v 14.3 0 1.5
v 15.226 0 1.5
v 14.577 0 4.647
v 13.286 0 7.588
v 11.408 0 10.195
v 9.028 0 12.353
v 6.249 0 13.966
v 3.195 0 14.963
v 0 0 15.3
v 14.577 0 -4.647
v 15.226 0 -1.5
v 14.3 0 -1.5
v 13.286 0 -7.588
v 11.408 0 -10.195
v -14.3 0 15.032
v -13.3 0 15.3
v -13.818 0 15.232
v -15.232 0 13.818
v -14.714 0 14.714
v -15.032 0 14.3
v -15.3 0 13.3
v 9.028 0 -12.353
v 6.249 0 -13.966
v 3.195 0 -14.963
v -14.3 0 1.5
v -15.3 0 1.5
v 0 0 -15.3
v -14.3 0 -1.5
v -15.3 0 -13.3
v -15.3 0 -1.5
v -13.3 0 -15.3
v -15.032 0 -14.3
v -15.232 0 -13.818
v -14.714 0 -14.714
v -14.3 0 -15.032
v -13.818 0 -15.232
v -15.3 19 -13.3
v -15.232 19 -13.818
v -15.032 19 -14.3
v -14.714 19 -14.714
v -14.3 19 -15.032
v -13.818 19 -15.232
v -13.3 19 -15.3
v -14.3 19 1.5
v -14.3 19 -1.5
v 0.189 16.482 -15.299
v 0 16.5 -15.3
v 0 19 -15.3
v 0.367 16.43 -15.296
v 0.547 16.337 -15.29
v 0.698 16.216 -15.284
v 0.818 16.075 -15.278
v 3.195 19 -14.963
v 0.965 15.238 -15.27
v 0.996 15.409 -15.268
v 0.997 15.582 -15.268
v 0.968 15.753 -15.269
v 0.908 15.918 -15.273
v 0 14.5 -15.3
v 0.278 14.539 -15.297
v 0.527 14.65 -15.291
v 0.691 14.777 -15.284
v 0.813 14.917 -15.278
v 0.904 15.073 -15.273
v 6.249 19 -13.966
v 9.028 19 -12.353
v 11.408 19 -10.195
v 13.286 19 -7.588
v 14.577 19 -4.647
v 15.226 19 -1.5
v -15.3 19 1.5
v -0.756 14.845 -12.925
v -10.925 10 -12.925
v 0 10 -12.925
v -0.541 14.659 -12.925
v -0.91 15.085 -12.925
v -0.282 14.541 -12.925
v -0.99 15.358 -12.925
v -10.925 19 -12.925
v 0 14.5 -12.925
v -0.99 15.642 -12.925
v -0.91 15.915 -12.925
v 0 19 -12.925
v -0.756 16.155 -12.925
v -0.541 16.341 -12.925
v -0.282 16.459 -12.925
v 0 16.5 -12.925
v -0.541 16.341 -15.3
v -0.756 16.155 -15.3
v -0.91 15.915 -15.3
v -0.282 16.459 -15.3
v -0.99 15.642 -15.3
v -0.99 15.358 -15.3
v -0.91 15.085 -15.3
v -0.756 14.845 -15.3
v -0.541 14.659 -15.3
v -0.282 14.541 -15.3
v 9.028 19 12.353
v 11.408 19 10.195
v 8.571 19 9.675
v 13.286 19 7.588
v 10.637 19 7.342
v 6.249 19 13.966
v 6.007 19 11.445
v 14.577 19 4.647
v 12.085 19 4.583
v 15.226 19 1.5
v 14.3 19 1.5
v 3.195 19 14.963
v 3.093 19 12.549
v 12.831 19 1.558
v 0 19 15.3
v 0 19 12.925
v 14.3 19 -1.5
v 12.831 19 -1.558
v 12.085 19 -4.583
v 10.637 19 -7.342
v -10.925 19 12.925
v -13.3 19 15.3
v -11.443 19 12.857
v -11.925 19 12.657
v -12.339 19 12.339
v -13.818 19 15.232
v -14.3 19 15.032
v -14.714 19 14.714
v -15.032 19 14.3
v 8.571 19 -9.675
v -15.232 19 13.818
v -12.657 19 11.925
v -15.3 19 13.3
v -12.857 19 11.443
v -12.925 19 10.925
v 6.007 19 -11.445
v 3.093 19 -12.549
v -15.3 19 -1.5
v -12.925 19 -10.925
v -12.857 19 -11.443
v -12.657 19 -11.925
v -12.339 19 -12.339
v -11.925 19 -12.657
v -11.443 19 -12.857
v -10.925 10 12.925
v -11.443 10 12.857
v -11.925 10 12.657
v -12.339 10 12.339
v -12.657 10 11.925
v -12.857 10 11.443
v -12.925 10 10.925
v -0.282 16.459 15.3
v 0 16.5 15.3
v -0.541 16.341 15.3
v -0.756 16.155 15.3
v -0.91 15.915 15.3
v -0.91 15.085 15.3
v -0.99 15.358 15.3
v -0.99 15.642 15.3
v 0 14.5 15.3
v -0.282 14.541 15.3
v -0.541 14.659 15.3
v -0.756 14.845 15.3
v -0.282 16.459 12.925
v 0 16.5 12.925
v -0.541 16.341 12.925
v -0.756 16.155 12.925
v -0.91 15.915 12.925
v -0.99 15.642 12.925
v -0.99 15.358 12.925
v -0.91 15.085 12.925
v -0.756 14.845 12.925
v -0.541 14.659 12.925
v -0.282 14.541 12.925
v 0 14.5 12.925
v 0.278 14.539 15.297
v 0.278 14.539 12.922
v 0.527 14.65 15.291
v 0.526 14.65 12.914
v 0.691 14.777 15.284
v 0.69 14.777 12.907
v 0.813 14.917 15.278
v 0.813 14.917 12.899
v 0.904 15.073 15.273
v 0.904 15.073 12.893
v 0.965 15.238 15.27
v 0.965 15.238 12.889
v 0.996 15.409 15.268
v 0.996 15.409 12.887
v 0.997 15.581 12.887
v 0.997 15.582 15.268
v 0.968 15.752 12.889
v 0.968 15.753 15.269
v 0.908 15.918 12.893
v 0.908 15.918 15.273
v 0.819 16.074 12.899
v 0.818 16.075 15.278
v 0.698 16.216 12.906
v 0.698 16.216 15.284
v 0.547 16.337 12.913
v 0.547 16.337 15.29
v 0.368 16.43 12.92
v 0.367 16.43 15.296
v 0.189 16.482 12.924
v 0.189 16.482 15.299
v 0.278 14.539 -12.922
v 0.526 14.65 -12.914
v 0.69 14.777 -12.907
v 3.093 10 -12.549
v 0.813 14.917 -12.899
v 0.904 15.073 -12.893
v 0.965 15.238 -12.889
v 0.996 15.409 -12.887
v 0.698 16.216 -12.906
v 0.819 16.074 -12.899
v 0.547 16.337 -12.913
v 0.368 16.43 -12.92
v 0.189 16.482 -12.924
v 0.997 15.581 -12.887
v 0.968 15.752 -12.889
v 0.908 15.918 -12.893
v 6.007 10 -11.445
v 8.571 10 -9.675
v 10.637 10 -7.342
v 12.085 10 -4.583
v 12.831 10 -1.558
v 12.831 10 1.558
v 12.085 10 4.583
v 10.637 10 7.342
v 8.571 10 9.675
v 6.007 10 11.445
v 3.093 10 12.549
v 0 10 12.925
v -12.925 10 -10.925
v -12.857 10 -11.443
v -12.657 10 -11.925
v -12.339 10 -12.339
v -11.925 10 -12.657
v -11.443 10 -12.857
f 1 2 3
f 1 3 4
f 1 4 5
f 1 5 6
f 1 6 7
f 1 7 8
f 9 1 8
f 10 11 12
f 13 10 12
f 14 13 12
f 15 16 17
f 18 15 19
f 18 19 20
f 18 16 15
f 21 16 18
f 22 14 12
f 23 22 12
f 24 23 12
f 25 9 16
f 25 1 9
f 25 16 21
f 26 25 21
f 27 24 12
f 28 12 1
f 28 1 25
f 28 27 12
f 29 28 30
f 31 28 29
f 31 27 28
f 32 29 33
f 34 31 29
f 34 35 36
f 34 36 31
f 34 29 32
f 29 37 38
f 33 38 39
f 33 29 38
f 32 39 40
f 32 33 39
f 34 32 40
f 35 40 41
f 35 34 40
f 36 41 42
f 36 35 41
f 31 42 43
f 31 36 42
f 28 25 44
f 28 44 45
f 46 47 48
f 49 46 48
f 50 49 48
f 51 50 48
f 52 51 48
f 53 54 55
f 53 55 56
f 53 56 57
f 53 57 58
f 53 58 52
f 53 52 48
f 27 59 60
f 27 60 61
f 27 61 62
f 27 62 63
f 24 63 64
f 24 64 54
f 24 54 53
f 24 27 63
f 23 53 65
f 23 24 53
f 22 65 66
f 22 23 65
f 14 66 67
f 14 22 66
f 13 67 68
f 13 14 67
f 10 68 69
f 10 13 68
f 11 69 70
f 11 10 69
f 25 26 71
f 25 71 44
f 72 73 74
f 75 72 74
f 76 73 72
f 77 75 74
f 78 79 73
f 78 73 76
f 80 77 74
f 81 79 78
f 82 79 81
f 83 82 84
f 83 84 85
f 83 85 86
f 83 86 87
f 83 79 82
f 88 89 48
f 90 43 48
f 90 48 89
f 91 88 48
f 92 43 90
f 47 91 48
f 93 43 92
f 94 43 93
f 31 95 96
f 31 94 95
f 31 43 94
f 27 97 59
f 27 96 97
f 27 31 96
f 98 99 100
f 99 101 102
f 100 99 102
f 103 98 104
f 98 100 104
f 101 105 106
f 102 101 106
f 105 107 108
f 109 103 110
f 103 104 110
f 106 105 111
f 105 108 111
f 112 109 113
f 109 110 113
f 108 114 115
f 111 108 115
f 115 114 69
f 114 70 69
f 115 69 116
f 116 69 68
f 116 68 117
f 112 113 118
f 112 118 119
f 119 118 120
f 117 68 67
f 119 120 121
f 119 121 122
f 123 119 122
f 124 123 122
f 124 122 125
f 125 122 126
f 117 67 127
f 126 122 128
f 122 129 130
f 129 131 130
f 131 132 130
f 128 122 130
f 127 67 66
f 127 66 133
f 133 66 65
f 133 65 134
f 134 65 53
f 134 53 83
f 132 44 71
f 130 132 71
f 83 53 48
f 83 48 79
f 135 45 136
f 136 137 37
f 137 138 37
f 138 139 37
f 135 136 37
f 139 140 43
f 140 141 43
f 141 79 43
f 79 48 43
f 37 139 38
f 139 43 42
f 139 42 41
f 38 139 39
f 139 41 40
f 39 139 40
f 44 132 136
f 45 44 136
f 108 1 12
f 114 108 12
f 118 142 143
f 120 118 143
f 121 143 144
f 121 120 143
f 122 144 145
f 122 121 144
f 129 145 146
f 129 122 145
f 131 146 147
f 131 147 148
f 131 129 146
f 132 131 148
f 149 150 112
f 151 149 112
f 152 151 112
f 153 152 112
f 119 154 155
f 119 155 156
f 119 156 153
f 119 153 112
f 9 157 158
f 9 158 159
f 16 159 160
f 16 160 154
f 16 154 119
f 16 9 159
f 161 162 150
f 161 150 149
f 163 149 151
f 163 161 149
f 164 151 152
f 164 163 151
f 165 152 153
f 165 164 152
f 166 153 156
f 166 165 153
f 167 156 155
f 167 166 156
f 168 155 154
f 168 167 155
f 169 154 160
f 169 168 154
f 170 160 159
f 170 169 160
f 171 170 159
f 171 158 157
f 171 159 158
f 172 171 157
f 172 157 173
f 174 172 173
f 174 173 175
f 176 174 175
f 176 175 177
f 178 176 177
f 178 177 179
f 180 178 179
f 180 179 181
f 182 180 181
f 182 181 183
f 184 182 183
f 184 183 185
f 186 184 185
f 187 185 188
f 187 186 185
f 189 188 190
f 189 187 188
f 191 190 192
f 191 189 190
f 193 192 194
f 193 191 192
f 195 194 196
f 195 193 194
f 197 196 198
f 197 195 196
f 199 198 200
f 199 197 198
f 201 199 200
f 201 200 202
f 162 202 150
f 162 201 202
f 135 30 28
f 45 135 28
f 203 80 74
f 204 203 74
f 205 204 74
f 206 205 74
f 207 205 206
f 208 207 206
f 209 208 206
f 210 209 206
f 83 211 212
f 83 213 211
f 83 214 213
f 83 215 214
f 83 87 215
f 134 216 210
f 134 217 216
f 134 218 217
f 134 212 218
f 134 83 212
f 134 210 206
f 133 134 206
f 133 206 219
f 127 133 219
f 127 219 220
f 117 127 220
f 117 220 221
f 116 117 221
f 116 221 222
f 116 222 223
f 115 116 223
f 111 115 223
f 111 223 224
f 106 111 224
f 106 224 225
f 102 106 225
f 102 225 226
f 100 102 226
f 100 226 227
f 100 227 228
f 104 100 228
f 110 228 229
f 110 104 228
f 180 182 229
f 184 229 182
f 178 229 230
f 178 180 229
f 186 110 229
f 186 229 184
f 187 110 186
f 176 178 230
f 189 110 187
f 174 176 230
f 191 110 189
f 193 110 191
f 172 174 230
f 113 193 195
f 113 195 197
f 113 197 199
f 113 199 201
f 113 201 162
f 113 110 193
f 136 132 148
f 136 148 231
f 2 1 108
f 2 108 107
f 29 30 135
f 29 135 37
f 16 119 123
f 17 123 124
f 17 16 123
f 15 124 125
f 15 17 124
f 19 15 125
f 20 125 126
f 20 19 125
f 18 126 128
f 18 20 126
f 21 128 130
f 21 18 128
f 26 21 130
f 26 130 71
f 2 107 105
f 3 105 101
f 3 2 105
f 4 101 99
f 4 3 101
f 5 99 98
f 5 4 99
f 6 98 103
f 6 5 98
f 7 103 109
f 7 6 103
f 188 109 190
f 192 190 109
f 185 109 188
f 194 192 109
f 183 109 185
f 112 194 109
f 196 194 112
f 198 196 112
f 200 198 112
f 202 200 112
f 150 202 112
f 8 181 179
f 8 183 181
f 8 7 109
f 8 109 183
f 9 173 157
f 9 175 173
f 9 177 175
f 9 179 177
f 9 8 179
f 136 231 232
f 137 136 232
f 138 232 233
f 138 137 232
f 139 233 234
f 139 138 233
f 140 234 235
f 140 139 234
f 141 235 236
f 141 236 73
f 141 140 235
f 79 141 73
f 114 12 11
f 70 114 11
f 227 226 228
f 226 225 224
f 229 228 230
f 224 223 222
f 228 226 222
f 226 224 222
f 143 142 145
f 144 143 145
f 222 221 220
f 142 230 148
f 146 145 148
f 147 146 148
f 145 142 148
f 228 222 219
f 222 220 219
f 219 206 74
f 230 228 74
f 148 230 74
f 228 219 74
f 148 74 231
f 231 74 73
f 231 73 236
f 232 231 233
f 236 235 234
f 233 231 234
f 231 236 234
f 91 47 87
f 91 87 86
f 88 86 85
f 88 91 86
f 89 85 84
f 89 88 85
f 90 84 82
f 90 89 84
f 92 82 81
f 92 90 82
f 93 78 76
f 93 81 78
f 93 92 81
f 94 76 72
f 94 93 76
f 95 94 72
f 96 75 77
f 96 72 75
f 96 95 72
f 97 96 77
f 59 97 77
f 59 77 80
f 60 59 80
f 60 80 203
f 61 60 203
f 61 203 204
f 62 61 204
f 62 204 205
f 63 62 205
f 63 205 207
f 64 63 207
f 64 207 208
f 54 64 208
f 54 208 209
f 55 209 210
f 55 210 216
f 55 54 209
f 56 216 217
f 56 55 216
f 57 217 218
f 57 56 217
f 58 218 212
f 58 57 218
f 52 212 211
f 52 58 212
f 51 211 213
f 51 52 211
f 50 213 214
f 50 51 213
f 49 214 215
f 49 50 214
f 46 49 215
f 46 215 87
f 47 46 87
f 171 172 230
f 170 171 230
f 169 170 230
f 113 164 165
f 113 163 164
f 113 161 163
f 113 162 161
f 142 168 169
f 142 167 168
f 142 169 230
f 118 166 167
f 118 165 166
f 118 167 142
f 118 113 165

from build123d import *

# Parameters (mm, degrees)
BOSS_EXTRUDE1_DEPTH     = 19
CUT_EXTRUDE1_DEPTH      = 9
CUT_EXTRUDE2_DEPTH      = 29.795485757
CUT_EXTRUDE2_DEPTH_BACK = 29.795485757
SKETCH3_R               = 1
SKETCH8_W               = 1
SKETCH8_H               = 3
CUT_EXTRUDE9_DEPTH      = 29.79548593


with BuildPart() as part:
    # Sketch1 → Boss-Extrude1 (new body)
    with BuildSketch(Plane(origin=(0, 0, 0), x_dir=(1, 0, 0), z_dir=(0, 1, 0))):
        with BuildLine():
            Line((-13.3, 15.3), (0, 15.3))
            ThreePointArc((0, 15.3), (15.3, 0), (0, -15.3))
            Line((0, -15.3), (-13.3, -15.3))
            ThreePointArc((-13.3, -15.3), (-14.714213562, -14.714213562), (-15.3, -13.3))
            Line((-15.3, -13.3), (-15.3, 13.3))
            ThreePointArc((-15.3, 13.3), (-14.714213562, 14.714213562), (-13.3, 15.3))
        make_face()
    extrude(amount=BOSS_EXTRUDE1_DEPTH)

    # Sketch2 → Cut-Extrude1 (cut)
    with BuildSketch(Plane(origin=(0, 19, 0), x_dir=(1, 0, 0), z_dir=(0, 1, 0))):
        with BuildLine():
            Line((-10.925, 12.925), (0, 12.925))
            ThreePointArc((0, 12.925), (12.925, 0), (0, -12.925))
            Line((0, -12.925), (-10.925, -12.925))
            ThreePointArc((-10.925, -12.925), (-12.339213562, -12.339213562), (-12.925, -10.925))
            Line((-12.925, -10.925), (-12.925, 10.925))
            ThreePointArc((-12.925, 10.925), (-12.339213562, 12.339213562), (-10.925, 12.925))
        make_face()
    extrude(amount=-CUT_EXTRUDE1_DEPTH, mode=Mode.SUBTRACT)

    # Sketch3 → Cut-Extrude2 (cut, two sides: drawn at the far end of the back side and taken through both)
    with BuildSketch(Plane.XY.offset(-CUT_EXTRUDE2_DEPTH_BACK)):
        with Locations(Location((0, 15.5, 0), (0, 0, 90))):
            Circle(SKETCH3_R)
    extrude(amount=CUT_EXTRUDE2_DEPTH + CUT_EXTRUDE2_DEPTH_BACK, mode=Mode.SUBTRACT)

    # Sketch8 → Cut-Extrude9 (cut, through all)
    with BuildSketch(Plane(origin=(0, 0, 0), x_dir=(1, 0, 0), z_dir=(0, 1, 0))):
        with Locations((14.8, 0)):
            Rectangle(SKETCH8_W, SKETCH8_H)
        with Locations((-14.8, 0)):
            Rectangle(SKETCH8_W, SKETCH8_H)
    extrude(amount=CUT_EXTRUDE9_DEPTH, mode=Mode.SUBTRACT)


solid = part.part
